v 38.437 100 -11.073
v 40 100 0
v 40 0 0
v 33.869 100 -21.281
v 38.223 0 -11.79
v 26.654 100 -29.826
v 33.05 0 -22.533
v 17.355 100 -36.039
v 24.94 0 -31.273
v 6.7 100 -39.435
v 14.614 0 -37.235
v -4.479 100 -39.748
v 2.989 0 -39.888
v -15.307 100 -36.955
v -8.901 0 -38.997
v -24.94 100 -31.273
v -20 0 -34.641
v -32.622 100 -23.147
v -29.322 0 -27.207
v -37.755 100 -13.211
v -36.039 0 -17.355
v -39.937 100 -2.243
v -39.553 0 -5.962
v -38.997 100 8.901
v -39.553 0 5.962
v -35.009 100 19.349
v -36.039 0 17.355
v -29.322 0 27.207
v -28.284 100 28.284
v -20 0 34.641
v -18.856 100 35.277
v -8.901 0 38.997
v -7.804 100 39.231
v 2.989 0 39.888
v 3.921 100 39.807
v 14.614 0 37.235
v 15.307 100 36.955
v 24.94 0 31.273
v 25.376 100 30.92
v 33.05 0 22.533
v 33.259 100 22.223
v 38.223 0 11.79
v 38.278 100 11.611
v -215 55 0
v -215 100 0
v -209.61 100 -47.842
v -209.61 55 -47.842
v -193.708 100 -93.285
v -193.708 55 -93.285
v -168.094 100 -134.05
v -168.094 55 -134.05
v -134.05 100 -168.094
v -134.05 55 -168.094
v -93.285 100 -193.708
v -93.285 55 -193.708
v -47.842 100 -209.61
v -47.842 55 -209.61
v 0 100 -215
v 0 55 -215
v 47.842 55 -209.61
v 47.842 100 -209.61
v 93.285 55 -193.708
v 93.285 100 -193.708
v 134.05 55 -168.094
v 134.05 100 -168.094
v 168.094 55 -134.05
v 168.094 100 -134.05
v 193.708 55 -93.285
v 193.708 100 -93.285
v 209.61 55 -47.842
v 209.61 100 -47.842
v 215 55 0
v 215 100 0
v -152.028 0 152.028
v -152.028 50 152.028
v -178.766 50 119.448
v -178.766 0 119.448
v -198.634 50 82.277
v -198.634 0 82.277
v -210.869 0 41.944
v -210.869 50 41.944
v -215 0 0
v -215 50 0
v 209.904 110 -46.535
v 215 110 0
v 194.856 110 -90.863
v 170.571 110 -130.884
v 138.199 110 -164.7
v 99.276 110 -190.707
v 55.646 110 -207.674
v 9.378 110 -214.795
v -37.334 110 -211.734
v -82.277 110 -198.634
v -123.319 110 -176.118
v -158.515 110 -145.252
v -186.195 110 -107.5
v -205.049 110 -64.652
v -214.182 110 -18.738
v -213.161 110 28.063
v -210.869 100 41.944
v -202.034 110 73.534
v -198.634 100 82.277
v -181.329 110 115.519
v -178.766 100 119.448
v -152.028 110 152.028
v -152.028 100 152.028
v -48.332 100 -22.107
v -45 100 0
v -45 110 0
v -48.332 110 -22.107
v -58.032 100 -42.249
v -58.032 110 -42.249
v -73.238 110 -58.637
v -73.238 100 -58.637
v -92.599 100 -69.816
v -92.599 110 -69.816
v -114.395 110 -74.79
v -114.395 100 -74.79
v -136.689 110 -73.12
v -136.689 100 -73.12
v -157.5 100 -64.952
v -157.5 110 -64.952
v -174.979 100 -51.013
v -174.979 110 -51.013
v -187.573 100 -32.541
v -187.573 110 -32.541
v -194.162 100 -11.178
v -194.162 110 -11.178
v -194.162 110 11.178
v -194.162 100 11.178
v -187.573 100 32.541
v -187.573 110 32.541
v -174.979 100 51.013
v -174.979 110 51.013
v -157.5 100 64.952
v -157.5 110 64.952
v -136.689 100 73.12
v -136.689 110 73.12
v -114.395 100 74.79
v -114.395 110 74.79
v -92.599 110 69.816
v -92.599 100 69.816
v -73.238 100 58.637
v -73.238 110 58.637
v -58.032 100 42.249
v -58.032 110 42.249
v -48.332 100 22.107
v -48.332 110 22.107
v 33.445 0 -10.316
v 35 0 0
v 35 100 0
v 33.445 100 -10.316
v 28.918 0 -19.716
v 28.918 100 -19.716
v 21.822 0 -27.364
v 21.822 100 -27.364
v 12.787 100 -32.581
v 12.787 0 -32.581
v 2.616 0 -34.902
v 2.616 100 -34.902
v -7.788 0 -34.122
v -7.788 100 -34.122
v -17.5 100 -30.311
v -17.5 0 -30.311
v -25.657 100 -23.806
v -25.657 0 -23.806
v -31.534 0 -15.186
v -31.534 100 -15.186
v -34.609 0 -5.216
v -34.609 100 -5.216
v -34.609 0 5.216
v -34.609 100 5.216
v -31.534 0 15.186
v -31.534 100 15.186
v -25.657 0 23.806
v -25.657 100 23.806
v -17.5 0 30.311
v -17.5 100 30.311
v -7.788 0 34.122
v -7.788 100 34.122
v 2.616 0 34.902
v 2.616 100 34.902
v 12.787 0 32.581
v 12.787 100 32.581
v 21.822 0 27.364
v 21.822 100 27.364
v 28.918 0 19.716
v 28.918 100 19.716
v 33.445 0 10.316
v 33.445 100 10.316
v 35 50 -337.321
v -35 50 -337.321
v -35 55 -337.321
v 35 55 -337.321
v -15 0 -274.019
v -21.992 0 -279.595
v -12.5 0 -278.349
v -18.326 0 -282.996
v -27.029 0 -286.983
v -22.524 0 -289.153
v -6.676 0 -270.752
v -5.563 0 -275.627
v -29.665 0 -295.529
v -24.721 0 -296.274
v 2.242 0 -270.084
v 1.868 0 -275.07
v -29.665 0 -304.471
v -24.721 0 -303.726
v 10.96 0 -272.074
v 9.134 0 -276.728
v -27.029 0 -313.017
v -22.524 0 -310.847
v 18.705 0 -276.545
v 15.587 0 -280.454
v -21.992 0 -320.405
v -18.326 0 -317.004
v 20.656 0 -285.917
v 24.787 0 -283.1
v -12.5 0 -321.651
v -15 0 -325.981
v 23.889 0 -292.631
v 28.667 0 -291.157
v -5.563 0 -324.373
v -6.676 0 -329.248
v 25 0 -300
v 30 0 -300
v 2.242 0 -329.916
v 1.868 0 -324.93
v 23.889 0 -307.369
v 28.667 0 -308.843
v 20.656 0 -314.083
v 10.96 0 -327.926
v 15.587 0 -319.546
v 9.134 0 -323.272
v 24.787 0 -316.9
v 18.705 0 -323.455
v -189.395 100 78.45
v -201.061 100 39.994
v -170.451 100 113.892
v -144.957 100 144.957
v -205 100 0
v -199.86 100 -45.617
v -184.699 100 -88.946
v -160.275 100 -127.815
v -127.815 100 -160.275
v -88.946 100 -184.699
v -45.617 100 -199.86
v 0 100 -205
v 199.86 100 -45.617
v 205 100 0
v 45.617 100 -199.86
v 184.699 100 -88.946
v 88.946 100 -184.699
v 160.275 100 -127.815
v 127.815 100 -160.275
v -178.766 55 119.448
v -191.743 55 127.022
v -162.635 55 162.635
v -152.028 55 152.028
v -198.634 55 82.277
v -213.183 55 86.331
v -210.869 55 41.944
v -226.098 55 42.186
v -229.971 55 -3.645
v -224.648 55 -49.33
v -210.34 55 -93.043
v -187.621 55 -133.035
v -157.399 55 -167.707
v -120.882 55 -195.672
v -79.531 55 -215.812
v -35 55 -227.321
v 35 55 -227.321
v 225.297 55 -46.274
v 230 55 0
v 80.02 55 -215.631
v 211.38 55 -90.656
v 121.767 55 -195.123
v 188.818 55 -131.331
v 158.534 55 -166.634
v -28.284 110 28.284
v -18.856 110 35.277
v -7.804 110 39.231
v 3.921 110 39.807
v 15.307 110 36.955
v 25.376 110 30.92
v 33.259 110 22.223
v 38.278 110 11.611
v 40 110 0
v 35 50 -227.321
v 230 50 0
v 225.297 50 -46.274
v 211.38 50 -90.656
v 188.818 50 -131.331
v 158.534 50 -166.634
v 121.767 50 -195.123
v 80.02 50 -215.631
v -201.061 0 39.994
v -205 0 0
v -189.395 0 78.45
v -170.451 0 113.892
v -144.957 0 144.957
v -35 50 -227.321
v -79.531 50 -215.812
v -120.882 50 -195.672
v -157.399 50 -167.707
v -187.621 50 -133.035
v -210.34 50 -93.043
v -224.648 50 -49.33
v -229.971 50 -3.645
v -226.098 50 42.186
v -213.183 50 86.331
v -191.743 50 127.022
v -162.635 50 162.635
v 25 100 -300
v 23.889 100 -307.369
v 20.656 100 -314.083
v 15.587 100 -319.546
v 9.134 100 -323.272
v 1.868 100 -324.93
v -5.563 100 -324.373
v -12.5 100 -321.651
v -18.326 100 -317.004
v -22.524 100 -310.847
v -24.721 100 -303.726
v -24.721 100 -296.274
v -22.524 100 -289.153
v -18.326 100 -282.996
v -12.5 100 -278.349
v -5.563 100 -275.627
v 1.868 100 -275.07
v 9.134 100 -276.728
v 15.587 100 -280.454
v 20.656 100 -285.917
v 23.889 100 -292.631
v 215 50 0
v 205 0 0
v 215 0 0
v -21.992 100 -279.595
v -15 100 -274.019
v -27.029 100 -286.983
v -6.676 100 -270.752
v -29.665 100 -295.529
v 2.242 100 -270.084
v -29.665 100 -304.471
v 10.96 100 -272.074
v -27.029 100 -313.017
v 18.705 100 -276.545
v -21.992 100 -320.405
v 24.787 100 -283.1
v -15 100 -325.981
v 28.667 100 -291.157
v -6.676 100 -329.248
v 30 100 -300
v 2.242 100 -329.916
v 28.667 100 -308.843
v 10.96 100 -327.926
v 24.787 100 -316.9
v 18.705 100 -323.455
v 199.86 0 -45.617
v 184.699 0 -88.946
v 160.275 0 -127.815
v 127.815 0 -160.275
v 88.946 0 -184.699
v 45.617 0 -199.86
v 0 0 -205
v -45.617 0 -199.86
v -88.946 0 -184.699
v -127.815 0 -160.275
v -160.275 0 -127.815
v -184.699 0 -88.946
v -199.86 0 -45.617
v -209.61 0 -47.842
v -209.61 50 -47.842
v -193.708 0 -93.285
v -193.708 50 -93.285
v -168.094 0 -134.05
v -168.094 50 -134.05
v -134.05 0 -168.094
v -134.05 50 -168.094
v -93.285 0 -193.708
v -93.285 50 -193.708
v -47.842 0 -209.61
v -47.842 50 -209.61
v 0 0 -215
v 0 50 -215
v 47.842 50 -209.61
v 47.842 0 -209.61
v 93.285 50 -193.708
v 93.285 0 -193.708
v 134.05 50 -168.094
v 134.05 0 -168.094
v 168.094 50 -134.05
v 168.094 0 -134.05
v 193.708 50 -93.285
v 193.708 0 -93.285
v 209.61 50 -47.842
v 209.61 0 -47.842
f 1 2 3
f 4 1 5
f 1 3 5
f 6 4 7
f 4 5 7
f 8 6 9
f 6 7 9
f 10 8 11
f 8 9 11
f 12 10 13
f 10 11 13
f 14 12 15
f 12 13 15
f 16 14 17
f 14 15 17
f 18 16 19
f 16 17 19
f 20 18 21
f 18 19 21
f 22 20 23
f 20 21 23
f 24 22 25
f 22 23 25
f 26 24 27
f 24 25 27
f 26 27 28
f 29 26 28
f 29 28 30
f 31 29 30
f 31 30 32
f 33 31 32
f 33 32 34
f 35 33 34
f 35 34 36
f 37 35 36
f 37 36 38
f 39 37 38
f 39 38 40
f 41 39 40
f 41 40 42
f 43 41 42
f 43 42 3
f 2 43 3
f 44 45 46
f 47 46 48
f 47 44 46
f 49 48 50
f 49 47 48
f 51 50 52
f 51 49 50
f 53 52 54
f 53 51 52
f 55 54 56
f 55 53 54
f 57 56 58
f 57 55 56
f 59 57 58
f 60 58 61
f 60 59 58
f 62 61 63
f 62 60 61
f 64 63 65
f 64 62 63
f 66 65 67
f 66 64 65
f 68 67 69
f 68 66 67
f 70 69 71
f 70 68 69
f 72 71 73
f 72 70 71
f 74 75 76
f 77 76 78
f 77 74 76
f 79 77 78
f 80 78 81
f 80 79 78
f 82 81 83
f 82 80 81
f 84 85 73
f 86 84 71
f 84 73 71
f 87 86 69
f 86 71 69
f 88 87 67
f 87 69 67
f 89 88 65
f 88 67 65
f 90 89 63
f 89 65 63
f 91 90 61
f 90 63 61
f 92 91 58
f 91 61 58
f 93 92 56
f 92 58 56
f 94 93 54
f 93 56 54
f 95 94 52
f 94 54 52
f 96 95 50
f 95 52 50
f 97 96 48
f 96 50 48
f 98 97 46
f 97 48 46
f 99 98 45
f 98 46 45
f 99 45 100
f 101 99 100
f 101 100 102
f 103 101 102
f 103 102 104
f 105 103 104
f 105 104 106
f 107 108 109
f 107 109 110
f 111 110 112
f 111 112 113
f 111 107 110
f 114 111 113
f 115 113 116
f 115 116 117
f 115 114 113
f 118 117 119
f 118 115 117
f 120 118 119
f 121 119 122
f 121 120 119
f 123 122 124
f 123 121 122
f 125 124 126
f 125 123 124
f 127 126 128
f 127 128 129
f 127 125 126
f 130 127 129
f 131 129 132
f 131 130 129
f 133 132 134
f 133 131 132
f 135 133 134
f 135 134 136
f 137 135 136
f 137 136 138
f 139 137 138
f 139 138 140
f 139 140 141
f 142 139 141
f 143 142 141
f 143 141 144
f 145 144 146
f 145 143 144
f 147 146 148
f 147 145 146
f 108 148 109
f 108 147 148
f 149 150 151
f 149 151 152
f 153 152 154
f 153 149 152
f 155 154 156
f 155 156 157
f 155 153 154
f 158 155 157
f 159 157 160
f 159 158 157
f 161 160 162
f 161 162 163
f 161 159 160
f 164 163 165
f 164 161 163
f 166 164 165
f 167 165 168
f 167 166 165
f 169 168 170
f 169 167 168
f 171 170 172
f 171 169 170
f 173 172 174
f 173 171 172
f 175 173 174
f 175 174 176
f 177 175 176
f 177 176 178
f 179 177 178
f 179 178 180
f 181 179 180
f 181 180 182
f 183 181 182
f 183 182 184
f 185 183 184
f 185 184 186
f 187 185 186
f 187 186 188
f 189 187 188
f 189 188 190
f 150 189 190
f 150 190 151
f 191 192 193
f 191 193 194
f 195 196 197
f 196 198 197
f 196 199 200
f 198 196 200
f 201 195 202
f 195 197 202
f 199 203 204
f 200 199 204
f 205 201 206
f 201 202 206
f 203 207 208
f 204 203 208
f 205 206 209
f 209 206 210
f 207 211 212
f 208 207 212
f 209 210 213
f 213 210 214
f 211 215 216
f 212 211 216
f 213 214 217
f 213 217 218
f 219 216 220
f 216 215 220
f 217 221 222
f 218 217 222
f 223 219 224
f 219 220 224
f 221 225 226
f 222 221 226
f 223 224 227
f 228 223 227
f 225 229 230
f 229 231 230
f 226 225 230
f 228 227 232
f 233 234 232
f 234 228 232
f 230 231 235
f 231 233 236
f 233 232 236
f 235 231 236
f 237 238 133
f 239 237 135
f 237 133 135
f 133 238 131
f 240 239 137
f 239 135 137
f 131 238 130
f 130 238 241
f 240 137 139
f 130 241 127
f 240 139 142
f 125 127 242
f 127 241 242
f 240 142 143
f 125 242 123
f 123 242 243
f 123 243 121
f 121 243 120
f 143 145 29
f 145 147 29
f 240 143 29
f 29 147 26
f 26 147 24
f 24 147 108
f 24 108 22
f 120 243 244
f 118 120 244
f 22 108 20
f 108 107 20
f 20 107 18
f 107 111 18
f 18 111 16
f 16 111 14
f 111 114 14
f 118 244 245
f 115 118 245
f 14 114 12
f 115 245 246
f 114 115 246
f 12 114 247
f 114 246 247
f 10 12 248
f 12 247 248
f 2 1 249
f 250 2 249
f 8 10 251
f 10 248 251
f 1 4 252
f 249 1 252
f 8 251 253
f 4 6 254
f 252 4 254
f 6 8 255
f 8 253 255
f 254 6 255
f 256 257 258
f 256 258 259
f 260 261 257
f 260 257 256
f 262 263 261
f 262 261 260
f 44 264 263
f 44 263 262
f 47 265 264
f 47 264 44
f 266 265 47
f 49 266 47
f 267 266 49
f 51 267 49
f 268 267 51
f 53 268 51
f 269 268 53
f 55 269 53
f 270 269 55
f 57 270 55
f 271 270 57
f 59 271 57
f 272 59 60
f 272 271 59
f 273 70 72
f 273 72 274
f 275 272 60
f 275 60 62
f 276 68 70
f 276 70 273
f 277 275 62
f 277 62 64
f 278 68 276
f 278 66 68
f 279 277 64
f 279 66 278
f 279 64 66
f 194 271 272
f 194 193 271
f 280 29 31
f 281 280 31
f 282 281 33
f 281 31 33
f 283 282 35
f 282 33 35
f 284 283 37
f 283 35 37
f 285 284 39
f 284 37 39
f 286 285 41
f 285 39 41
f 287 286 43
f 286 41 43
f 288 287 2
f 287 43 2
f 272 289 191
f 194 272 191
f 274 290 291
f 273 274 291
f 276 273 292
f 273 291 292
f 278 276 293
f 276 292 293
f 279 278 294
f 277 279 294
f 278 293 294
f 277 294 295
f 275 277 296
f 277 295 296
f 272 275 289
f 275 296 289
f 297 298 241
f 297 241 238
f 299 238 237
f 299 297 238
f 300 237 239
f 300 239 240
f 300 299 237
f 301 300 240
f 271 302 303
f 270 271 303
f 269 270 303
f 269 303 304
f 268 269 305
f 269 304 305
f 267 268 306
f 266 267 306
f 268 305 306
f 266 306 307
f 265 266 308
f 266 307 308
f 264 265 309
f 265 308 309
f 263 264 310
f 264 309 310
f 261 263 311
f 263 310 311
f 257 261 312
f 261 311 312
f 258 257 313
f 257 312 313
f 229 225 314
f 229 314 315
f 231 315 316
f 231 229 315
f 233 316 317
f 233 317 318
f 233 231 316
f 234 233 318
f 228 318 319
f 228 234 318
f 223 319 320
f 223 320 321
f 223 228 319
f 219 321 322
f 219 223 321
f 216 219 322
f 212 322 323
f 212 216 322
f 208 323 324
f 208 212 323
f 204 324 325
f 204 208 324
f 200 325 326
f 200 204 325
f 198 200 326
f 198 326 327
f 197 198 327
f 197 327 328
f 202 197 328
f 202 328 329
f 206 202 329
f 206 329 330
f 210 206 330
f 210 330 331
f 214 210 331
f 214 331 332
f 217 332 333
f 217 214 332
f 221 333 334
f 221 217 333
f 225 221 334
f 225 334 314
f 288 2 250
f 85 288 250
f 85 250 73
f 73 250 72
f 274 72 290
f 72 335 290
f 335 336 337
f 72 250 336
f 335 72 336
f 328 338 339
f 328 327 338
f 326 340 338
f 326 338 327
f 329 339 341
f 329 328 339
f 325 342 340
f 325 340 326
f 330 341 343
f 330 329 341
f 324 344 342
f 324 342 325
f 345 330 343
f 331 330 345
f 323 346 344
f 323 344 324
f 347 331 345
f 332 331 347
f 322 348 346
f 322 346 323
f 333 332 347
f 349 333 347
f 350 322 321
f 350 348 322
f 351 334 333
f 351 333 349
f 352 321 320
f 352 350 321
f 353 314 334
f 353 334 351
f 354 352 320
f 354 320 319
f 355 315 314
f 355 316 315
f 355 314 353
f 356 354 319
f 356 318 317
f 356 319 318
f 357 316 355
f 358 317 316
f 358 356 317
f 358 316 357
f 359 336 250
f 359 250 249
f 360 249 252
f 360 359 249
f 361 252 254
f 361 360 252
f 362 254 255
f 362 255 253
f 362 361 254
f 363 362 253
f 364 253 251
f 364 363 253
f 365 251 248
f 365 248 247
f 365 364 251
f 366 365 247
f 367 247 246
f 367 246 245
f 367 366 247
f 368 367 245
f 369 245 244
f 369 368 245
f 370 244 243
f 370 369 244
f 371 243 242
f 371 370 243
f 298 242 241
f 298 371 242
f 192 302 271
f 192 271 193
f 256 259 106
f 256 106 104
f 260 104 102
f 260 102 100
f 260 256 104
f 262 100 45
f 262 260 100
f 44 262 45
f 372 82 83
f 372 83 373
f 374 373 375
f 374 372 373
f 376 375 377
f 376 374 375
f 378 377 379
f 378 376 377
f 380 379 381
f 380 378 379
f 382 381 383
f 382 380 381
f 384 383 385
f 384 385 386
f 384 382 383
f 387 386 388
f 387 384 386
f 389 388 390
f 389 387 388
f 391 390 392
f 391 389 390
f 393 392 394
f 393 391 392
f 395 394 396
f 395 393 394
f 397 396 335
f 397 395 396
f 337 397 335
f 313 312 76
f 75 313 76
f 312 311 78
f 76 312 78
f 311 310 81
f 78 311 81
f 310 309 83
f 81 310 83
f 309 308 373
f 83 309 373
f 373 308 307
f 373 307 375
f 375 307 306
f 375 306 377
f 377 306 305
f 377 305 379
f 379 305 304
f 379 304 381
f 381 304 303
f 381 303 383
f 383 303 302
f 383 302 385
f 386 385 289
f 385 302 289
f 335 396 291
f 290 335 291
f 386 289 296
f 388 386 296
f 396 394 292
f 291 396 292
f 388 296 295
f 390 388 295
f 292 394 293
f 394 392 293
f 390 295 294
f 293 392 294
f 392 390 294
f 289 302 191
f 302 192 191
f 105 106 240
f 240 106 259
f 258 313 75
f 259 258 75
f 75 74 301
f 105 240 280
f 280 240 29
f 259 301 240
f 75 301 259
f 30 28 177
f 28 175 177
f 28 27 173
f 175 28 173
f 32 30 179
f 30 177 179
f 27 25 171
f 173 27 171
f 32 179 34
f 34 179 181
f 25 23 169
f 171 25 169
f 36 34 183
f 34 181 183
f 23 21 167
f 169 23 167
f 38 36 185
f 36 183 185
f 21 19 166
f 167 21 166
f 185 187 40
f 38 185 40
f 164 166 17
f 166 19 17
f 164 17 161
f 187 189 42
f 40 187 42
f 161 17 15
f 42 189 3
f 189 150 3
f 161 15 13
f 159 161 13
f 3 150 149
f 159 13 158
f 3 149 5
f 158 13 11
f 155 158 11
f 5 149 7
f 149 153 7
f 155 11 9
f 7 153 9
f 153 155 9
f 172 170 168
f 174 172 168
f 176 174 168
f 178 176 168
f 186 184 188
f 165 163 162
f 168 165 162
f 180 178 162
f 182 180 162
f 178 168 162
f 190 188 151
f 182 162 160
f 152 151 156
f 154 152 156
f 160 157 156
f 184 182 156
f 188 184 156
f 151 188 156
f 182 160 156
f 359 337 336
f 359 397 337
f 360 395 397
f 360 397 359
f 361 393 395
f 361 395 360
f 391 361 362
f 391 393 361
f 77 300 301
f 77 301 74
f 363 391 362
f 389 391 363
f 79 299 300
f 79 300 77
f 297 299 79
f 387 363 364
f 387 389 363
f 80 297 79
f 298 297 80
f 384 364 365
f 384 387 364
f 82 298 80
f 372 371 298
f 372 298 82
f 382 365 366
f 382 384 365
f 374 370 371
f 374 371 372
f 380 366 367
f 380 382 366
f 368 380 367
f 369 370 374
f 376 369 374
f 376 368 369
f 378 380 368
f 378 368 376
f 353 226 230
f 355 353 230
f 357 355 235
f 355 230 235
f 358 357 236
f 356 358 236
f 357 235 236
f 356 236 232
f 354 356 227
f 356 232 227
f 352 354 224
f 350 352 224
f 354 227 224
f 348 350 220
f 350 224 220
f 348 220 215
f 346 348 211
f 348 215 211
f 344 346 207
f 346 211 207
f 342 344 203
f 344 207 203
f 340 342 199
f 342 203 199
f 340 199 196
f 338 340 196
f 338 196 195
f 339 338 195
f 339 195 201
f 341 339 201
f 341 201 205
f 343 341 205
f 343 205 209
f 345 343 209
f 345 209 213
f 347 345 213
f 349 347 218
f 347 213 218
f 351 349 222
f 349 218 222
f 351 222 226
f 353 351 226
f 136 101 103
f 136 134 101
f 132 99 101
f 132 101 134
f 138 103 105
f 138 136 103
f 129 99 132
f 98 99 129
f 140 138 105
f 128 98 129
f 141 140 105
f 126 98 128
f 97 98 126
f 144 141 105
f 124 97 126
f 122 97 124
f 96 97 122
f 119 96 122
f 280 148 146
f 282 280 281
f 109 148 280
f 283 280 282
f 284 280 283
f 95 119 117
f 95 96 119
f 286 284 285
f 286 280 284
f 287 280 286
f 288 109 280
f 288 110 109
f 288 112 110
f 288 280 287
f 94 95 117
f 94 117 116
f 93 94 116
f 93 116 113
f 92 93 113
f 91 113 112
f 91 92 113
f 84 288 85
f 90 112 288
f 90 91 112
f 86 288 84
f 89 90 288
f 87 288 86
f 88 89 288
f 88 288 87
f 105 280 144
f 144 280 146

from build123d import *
from build123d.topology import SkipClean

# Parameters (mm, degrees)
CROQUIS1_R                = 40
CROQUIS1_R_2              = 35
SALIENTE_EXTRUIR1_DEPTH   = 100
CROQUIS2_R                = 30
CROQUIS2_R_2              = 25
SALIENTE_EXTRUIR2_DEPTH   = 100
SALIENTE_EXTRUIR2_2_DEPTH = 100
CROQUIS3_R                = 75
SALIENTE_EXTRUIR3_DEPTH   = 10
SALIENTE_EXTRUIR9_DEPTH   = 5
SALIENTE_EXTRUIR11_DEPTH  = 10


with BuildPart() as part:
    # Croquis1 → Saliente-Extruir1 (new body)
    with BuildSketch(Plane(origin=(0, 0, 0), x_dir=(1, 0, 0), z_dir=(0, 1, 0))):
        Circle(CROQUIS1_R)
        Circle(CROQUIS1_R_2, mode=Mode.SUBTRACT)
    extrude(amount=SALIENTE_EXTRUIR1_DEPTH)



with BuildPart() as body_2:
    # Croquis2 → Saliente-Extruir2 (new body)
    with BuildSketch(Plane(origin=(0, 0, 0), x_dir=(1, 0, 0), z_dir=(0, 1, 0))):
        with Locations((0, 300)):
            Circle(CROQUIS2_R)
        with Locations((0, 300)):
            Circle(CROQUIS2_R_2, mode=Mode.SUBTRACT)
    extrude(amount=SALIENTE_EXTRUIR2_DEPTH)


with BuildPart() as body_3:
    # Croquis2 → Saliente-Extruir2 2 (new body)
    with BuildSketch(Plane(origin=(0, 0, 0), x_dir=(1, 0, 0), z_dir=(0, 1, 0))):
        with BuildLine():
            Line((215, 0), (205, 0))
            ThreePointArc((205, 0), (0, 205), (-205, 0))
            ThreePointArc((-205, 0), (-189.395304, -78.450104), (-144.95689, -144.95689))
            Line((-144.95689, -144.95689), (-152.027958, -152.027958))
            ThreePointArc((-152.027958, -152.027958), (-198.634099, -82.276938), (-215, 0))
            ThreePointArc((-215, 0), (0, 215), (215, 0))
        make_face()
    extrude(amount=SALIENTE_EXTRUIR2_2_DEPTH)


with BuildPart() as part_1:
    add(part.part)

    add(body_3.part)  # Saliente-Extruir3 merges body 3
    # Croquis3 → Saliente-Extruir3 (add)
    with BuildSketch(Plane(origin=(0, 100, 0), x_dir=(1, 0, 0), z_dir=(0, 1, 0))):
        with BuildLine():
            ThreePointArc((215, 0), (-82.276938, 198.634099), (-152.027958, -152.027958))
            Line((-152.027958, -152.027958), (0, 0))
            Line((0, 0), (215, 0))
        make_face()
        with Locations((-120, 0)):
            Circle(CROQUIS3_R, mode=Mode.SUBTRACT)
    extrude(amount=SALIENTE_EXTRUIR3_DEPTH)

    # Croquis6 → Saliente-Extruir9 (add)
    with BuildSketch(Plane(origin=(0, 50, 0), x_dir=(1, 0, 0), z_dir=(0, 1, 0))):
        with BuildLine():
            Line((-162.63456, -162.63456), (-152.027958, -152.027958))
            ThreePointArc((-152.027958, -152.027958), (-82.276938, 198.634099), (215, 0))
            Line((215, 0), (230, 0))
            ThreePointArc((230, 0), (174.570903, 149.749791), (35, 227.321358))
            Line((35, 227.321358), (35, 337.321358))
            Line((35, 337.321358), (-35, 337.321358))
            Line((-35, 337.321358), (-35, 227.321358))
            ThreePointArc((-35, 227.321358), (-218.589248, 71.545375), (-162.63456, -162.63456))
        make_face()
    extrude(amount=SALIENTE_EXTRUIR9_DEPTH)

    # Croquis8 → Saliente-Extruir11 (add)
    with SkipClean():  # the faces are left unmerged after this step: merging them gives an invalid solid
        with BuildSketch(Plane(origin=(0, 100, 0), x_dir=(1, 0, 0), z_dir=(0, 1, 0))):
            with BuildLine():
                Line((0, 0), (-28.284271, -28.284271))
                ThreePointArc((-28.284271, -28.284271), (15.307337, -36.955181), (40, 0))
                Line((40, 0), (0, 0))
            make_face()
        extrude(amount=SALIENTE_EXTRUIR11_DEPTH)


solid = Compound([body_2.part, part_1.part])
